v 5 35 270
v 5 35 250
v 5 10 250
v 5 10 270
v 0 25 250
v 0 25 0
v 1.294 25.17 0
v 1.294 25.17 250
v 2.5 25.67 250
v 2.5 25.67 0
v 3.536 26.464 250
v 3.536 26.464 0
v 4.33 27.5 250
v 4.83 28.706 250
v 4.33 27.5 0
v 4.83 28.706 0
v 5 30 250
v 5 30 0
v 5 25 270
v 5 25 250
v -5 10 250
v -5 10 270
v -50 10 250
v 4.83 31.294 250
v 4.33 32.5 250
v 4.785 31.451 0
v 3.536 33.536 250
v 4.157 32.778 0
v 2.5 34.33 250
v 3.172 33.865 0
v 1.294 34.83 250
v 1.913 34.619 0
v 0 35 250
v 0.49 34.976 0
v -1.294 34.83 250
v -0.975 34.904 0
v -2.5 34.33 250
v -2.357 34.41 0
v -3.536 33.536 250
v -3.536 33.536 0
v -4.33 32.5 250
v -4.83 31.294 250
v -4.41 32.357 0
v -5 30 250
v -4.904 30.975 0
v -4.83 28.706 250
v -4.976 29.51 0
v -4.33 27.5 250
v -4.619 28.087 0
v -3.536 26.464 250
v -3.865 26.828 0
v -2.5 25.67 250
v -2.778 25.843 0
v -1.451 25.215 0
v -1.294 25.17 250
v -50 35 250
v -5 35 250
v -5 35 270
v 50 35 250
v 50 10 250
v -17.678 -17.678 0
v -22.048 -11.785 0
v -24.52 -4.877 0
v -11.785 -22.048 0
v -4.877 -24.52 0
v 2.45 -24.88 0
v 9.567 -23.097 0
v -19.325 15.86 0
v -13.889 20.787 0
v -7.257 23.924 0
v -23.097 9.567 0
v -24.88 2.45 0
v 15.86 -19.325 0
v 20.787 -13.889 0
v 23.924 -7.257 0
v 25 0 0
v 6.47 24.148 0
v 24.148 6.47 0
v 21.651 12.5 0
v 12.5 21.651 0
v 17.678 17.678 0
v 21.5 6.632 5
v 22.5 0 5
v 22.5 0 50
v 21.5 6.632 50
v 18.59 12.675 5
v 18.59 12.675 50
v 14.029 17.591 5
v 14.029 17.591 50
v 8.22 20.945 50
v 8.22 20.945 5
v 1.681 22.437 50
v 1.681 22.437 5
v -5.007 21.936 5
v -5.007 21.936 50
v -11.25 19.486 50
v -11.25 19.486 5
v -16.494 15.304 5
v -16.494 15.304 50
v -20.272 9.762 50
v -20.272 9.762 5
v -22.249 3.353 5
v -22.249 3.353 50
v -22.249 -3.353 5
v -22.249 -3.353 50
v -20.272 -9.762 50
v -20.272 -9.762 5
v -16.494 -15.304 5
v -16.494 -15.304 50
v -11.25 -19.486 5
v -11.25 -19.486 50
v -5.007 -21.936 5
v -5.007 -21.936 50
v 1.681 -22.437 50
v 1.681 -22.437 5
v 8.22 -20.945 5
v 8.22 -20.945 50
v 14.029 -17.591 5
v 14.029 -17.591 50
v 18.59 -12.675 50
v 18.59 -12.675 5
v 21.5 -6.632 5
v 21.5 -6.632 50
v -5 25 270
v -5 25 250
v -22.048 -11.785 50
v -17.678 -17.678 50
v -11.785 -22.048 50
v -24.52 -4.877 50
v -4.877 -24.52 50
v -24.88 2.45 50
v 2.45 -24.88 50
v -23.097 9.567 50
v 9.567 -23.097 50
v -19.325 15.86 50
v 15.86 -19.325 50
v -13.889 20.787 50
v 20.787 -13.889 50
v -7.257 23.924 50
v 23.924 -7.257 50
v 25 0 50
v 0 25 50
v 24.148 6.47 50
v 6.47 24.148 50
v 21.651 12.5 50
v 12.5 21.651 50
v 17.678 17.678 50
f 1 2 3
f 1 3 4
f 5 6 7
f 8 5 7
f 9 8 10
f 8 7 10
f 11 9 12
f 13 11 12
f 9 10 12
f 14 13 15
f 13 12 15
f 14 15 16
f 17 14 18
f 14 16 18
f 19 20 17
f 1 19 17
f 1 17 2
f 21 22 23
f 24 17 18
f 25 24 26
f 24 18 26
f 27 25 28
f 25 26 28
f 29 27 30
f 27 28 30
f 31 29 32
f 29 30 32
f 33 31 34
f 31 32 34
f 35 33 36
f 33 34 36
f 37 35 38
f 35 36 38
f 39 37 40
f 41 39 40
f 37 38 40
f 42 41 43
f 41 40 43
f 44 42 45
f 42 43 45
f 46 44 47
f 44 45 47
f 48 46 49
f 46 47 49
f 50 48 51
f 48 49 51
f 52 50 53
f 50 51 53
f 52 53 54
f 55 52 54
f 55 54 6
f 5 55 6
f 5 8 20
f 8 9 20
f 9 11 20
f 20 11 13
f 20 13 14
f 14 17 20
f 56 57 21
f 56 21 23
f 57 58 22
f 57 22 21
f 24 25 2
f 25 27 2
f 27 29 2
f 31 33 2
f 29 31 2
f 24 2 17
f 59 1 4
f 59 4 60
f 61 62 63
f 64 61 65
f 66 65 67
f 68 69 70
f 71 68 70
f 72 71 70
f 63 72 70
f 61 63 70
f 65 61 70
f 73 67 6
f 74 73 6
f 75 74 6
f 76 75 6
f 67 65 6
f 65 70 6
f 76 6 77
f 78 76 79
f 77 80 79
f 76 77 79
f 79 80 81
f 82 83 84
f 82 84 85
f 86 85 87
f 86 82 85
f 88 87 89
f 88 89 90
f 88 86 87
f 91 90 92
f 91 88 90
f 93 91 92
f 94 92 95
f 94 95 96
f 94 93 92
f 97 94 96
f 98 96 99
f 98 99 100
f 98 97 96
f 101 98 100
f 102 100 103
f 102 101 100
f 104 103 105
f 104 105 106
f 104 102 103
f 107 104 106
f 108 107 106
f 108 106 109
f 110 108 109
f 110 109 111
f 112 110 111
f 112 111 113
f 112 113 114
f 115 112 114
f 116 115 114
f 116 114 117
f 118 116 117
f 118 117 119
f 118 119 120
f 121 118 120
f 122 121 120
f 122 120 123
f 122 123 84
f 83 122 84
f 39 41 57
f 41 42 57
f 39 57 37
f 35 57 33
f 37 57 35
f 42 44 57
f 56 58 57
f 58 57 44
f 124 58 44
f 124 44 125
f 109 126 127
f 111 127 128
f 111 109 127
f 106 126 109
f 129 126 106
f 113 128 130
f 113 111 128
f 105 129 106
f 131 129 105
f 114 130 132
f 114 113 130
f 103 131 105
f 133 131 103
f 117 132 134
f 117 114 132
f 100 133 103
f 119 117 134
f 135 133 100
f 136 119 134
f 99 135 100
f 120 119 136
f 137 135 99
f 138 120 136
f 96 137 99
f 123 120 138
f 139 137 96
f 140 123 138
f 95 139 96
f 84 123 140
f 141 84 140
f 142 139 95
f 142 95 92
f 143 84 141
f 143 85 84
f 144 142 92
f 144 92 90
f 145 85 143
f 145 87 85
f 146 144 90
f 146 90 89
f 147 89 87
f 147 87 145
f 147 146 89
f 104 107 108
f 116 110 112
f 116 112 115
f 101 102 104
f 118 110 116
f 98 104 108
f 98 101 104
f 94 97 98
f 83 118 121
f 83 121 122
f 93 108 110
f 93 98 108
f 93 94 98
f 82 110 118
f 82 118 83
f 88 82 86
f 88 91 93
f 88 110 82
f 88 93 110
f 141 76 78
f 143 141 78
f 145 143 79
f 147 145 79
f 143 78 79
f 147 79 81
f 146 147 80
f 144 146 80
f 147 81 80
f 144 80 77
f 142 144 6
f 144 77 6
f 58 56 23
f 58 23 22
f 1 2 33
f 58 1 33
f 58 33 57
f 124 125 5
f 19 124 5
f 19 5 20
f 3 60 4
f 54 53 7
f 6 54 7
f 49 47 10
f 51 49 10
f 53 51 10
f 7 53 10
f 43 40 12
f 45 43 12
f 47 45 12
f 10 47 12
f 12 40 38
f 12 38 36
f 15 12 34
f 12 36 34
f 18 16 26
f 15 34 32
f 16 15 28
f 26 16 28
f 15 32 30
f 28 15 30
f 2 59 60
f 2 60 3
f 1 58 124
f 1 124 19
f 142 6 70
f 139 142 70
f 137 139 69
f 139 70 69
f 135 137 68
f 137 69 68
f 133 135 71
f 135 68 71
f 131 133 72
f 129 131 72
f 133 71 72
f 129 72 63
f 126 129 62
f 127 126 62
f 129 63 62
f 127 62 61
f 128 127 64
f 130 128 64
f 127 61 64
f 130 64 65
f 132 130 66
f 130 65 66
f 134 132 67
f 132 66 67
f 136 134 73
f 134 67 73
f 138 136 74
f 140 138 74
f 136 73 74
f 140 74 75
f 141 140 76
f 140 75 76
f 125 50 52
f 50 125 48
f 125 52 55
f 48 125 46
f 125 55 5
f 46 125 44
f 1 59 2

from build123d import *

# Parameters (mm, degrees)
F0_R     = 22.5
F1_DEPTH = 50
F2_DEPTH = 250
F3_DEPTH = 5
F5_DEPTH = 20
F7_DEPTH = 25


with BuildPart() as f1:
    # F0 (on Top) → F1 (new body)
    with BuildSketch(Plane.XY):
        with BuildLine():
            ThreePointArc((0, 25), (-17.6776695297, -17.6776695297), (25, 0))
            ThreePointArc((25, 0), (17.6776695297, 17.6776695297), (0, 25))
        make_face()
        Circle(F0_R, mode=Mode.SUBTRACT)
    extrude(amount=F1_DEPTH)

    # F0 (on Top) → F3 (join)
    with BuildSketch(Plane.XY):
        Circle(F0_R)
    extrude(amount=F3_DEPTH)


with BuildPart() as f2:
    # F0 (on Top) → F2 (new body)
    with BuildSketch(Plane.XY):
        with BuildLine():
            ThreePointArc((5, 30), (-3.5355339059, 33.5355339059), (0, 25))
            ThreePointArc((0, 25), (3.5355339059, 26.4644660941), (5, 30))
        make_face()
    extrude(amount=F2_DEPTH)

    # F4 (on face) → F5 (join)
    with BuildSketch(Plane.XY.offset(250)):
        with BuildLine():
            Line((0, 35), (-5, 35))
            Line((-5, 35), (-5, 30))
            ThreePointArc((-5, 30), (-3.5355339059, 33.5355339059), (0, 35))
        make_face()
        with BuildLine():
            ThreePointArc((5, 30), (3.5355339059, 33.5355339059), (0, 35))
            ThreePointArc((0, 35), (-3.5355339059, 33.5355339059), (-5, 30))
            ThreePointArc((-5, 30), (-3.5355339059, 26.4644660941), (0, 25))
            ThreePointArc((0, 25), (3.5355339059, 26.4644660941), (5, 30))
        make_face()
        with BuildLine():
            Line((5, 35), (0, 35))
            ThreePointArc((0, 35), (3.5355339059, 33.5355339059), (5, 30))
            Line((5, 30), (5, 35))
        make_face()
        with BuildLine():
            Line((5, 25), (5, 30))
            ThreePointArc((5, 30), (3.5355339059, 26.4644660941), (0, 25))
            Line((0, 25), (5, 25))
        make_face()
        with BuildLine():
            ThreePointArc((0, 25), (-3.5355339059, 26.4644660941), (-5, 30))
            Line((-5, 30), (-5, 25))
            Line((-5, 25), (0, 25))
        make_face()
    extrude(amount=F5_DEPTH)


with BuildPart() as f7:
    # F6 (on face) → F7 (new body)
    with BuildSketch(Plane(origin=(0, 35, 0), x_dir=(-1, 0, 0), z_dir=(0, 1, 0))):
        Polygon((-50, 250), (-5, 250), (-5, 270), align=None)
    extrude(amount=-F7_DEPTH)


with BuildPart() as f7b:
    # F6 (on face) → F7, piece 2 (new body)
    with BuildSketch(Plane(origin=(0, 35, 0), x_dir=(-1, 0, 0), z_dir=(0, 1, 0))):
        Polygon((5, 270), (5, 250), (50, 250), align=None)
    extrude(amount=-F7_DEPTH)


solid = Compound([f1.part, f2.part, f7.part, f7b.part])
